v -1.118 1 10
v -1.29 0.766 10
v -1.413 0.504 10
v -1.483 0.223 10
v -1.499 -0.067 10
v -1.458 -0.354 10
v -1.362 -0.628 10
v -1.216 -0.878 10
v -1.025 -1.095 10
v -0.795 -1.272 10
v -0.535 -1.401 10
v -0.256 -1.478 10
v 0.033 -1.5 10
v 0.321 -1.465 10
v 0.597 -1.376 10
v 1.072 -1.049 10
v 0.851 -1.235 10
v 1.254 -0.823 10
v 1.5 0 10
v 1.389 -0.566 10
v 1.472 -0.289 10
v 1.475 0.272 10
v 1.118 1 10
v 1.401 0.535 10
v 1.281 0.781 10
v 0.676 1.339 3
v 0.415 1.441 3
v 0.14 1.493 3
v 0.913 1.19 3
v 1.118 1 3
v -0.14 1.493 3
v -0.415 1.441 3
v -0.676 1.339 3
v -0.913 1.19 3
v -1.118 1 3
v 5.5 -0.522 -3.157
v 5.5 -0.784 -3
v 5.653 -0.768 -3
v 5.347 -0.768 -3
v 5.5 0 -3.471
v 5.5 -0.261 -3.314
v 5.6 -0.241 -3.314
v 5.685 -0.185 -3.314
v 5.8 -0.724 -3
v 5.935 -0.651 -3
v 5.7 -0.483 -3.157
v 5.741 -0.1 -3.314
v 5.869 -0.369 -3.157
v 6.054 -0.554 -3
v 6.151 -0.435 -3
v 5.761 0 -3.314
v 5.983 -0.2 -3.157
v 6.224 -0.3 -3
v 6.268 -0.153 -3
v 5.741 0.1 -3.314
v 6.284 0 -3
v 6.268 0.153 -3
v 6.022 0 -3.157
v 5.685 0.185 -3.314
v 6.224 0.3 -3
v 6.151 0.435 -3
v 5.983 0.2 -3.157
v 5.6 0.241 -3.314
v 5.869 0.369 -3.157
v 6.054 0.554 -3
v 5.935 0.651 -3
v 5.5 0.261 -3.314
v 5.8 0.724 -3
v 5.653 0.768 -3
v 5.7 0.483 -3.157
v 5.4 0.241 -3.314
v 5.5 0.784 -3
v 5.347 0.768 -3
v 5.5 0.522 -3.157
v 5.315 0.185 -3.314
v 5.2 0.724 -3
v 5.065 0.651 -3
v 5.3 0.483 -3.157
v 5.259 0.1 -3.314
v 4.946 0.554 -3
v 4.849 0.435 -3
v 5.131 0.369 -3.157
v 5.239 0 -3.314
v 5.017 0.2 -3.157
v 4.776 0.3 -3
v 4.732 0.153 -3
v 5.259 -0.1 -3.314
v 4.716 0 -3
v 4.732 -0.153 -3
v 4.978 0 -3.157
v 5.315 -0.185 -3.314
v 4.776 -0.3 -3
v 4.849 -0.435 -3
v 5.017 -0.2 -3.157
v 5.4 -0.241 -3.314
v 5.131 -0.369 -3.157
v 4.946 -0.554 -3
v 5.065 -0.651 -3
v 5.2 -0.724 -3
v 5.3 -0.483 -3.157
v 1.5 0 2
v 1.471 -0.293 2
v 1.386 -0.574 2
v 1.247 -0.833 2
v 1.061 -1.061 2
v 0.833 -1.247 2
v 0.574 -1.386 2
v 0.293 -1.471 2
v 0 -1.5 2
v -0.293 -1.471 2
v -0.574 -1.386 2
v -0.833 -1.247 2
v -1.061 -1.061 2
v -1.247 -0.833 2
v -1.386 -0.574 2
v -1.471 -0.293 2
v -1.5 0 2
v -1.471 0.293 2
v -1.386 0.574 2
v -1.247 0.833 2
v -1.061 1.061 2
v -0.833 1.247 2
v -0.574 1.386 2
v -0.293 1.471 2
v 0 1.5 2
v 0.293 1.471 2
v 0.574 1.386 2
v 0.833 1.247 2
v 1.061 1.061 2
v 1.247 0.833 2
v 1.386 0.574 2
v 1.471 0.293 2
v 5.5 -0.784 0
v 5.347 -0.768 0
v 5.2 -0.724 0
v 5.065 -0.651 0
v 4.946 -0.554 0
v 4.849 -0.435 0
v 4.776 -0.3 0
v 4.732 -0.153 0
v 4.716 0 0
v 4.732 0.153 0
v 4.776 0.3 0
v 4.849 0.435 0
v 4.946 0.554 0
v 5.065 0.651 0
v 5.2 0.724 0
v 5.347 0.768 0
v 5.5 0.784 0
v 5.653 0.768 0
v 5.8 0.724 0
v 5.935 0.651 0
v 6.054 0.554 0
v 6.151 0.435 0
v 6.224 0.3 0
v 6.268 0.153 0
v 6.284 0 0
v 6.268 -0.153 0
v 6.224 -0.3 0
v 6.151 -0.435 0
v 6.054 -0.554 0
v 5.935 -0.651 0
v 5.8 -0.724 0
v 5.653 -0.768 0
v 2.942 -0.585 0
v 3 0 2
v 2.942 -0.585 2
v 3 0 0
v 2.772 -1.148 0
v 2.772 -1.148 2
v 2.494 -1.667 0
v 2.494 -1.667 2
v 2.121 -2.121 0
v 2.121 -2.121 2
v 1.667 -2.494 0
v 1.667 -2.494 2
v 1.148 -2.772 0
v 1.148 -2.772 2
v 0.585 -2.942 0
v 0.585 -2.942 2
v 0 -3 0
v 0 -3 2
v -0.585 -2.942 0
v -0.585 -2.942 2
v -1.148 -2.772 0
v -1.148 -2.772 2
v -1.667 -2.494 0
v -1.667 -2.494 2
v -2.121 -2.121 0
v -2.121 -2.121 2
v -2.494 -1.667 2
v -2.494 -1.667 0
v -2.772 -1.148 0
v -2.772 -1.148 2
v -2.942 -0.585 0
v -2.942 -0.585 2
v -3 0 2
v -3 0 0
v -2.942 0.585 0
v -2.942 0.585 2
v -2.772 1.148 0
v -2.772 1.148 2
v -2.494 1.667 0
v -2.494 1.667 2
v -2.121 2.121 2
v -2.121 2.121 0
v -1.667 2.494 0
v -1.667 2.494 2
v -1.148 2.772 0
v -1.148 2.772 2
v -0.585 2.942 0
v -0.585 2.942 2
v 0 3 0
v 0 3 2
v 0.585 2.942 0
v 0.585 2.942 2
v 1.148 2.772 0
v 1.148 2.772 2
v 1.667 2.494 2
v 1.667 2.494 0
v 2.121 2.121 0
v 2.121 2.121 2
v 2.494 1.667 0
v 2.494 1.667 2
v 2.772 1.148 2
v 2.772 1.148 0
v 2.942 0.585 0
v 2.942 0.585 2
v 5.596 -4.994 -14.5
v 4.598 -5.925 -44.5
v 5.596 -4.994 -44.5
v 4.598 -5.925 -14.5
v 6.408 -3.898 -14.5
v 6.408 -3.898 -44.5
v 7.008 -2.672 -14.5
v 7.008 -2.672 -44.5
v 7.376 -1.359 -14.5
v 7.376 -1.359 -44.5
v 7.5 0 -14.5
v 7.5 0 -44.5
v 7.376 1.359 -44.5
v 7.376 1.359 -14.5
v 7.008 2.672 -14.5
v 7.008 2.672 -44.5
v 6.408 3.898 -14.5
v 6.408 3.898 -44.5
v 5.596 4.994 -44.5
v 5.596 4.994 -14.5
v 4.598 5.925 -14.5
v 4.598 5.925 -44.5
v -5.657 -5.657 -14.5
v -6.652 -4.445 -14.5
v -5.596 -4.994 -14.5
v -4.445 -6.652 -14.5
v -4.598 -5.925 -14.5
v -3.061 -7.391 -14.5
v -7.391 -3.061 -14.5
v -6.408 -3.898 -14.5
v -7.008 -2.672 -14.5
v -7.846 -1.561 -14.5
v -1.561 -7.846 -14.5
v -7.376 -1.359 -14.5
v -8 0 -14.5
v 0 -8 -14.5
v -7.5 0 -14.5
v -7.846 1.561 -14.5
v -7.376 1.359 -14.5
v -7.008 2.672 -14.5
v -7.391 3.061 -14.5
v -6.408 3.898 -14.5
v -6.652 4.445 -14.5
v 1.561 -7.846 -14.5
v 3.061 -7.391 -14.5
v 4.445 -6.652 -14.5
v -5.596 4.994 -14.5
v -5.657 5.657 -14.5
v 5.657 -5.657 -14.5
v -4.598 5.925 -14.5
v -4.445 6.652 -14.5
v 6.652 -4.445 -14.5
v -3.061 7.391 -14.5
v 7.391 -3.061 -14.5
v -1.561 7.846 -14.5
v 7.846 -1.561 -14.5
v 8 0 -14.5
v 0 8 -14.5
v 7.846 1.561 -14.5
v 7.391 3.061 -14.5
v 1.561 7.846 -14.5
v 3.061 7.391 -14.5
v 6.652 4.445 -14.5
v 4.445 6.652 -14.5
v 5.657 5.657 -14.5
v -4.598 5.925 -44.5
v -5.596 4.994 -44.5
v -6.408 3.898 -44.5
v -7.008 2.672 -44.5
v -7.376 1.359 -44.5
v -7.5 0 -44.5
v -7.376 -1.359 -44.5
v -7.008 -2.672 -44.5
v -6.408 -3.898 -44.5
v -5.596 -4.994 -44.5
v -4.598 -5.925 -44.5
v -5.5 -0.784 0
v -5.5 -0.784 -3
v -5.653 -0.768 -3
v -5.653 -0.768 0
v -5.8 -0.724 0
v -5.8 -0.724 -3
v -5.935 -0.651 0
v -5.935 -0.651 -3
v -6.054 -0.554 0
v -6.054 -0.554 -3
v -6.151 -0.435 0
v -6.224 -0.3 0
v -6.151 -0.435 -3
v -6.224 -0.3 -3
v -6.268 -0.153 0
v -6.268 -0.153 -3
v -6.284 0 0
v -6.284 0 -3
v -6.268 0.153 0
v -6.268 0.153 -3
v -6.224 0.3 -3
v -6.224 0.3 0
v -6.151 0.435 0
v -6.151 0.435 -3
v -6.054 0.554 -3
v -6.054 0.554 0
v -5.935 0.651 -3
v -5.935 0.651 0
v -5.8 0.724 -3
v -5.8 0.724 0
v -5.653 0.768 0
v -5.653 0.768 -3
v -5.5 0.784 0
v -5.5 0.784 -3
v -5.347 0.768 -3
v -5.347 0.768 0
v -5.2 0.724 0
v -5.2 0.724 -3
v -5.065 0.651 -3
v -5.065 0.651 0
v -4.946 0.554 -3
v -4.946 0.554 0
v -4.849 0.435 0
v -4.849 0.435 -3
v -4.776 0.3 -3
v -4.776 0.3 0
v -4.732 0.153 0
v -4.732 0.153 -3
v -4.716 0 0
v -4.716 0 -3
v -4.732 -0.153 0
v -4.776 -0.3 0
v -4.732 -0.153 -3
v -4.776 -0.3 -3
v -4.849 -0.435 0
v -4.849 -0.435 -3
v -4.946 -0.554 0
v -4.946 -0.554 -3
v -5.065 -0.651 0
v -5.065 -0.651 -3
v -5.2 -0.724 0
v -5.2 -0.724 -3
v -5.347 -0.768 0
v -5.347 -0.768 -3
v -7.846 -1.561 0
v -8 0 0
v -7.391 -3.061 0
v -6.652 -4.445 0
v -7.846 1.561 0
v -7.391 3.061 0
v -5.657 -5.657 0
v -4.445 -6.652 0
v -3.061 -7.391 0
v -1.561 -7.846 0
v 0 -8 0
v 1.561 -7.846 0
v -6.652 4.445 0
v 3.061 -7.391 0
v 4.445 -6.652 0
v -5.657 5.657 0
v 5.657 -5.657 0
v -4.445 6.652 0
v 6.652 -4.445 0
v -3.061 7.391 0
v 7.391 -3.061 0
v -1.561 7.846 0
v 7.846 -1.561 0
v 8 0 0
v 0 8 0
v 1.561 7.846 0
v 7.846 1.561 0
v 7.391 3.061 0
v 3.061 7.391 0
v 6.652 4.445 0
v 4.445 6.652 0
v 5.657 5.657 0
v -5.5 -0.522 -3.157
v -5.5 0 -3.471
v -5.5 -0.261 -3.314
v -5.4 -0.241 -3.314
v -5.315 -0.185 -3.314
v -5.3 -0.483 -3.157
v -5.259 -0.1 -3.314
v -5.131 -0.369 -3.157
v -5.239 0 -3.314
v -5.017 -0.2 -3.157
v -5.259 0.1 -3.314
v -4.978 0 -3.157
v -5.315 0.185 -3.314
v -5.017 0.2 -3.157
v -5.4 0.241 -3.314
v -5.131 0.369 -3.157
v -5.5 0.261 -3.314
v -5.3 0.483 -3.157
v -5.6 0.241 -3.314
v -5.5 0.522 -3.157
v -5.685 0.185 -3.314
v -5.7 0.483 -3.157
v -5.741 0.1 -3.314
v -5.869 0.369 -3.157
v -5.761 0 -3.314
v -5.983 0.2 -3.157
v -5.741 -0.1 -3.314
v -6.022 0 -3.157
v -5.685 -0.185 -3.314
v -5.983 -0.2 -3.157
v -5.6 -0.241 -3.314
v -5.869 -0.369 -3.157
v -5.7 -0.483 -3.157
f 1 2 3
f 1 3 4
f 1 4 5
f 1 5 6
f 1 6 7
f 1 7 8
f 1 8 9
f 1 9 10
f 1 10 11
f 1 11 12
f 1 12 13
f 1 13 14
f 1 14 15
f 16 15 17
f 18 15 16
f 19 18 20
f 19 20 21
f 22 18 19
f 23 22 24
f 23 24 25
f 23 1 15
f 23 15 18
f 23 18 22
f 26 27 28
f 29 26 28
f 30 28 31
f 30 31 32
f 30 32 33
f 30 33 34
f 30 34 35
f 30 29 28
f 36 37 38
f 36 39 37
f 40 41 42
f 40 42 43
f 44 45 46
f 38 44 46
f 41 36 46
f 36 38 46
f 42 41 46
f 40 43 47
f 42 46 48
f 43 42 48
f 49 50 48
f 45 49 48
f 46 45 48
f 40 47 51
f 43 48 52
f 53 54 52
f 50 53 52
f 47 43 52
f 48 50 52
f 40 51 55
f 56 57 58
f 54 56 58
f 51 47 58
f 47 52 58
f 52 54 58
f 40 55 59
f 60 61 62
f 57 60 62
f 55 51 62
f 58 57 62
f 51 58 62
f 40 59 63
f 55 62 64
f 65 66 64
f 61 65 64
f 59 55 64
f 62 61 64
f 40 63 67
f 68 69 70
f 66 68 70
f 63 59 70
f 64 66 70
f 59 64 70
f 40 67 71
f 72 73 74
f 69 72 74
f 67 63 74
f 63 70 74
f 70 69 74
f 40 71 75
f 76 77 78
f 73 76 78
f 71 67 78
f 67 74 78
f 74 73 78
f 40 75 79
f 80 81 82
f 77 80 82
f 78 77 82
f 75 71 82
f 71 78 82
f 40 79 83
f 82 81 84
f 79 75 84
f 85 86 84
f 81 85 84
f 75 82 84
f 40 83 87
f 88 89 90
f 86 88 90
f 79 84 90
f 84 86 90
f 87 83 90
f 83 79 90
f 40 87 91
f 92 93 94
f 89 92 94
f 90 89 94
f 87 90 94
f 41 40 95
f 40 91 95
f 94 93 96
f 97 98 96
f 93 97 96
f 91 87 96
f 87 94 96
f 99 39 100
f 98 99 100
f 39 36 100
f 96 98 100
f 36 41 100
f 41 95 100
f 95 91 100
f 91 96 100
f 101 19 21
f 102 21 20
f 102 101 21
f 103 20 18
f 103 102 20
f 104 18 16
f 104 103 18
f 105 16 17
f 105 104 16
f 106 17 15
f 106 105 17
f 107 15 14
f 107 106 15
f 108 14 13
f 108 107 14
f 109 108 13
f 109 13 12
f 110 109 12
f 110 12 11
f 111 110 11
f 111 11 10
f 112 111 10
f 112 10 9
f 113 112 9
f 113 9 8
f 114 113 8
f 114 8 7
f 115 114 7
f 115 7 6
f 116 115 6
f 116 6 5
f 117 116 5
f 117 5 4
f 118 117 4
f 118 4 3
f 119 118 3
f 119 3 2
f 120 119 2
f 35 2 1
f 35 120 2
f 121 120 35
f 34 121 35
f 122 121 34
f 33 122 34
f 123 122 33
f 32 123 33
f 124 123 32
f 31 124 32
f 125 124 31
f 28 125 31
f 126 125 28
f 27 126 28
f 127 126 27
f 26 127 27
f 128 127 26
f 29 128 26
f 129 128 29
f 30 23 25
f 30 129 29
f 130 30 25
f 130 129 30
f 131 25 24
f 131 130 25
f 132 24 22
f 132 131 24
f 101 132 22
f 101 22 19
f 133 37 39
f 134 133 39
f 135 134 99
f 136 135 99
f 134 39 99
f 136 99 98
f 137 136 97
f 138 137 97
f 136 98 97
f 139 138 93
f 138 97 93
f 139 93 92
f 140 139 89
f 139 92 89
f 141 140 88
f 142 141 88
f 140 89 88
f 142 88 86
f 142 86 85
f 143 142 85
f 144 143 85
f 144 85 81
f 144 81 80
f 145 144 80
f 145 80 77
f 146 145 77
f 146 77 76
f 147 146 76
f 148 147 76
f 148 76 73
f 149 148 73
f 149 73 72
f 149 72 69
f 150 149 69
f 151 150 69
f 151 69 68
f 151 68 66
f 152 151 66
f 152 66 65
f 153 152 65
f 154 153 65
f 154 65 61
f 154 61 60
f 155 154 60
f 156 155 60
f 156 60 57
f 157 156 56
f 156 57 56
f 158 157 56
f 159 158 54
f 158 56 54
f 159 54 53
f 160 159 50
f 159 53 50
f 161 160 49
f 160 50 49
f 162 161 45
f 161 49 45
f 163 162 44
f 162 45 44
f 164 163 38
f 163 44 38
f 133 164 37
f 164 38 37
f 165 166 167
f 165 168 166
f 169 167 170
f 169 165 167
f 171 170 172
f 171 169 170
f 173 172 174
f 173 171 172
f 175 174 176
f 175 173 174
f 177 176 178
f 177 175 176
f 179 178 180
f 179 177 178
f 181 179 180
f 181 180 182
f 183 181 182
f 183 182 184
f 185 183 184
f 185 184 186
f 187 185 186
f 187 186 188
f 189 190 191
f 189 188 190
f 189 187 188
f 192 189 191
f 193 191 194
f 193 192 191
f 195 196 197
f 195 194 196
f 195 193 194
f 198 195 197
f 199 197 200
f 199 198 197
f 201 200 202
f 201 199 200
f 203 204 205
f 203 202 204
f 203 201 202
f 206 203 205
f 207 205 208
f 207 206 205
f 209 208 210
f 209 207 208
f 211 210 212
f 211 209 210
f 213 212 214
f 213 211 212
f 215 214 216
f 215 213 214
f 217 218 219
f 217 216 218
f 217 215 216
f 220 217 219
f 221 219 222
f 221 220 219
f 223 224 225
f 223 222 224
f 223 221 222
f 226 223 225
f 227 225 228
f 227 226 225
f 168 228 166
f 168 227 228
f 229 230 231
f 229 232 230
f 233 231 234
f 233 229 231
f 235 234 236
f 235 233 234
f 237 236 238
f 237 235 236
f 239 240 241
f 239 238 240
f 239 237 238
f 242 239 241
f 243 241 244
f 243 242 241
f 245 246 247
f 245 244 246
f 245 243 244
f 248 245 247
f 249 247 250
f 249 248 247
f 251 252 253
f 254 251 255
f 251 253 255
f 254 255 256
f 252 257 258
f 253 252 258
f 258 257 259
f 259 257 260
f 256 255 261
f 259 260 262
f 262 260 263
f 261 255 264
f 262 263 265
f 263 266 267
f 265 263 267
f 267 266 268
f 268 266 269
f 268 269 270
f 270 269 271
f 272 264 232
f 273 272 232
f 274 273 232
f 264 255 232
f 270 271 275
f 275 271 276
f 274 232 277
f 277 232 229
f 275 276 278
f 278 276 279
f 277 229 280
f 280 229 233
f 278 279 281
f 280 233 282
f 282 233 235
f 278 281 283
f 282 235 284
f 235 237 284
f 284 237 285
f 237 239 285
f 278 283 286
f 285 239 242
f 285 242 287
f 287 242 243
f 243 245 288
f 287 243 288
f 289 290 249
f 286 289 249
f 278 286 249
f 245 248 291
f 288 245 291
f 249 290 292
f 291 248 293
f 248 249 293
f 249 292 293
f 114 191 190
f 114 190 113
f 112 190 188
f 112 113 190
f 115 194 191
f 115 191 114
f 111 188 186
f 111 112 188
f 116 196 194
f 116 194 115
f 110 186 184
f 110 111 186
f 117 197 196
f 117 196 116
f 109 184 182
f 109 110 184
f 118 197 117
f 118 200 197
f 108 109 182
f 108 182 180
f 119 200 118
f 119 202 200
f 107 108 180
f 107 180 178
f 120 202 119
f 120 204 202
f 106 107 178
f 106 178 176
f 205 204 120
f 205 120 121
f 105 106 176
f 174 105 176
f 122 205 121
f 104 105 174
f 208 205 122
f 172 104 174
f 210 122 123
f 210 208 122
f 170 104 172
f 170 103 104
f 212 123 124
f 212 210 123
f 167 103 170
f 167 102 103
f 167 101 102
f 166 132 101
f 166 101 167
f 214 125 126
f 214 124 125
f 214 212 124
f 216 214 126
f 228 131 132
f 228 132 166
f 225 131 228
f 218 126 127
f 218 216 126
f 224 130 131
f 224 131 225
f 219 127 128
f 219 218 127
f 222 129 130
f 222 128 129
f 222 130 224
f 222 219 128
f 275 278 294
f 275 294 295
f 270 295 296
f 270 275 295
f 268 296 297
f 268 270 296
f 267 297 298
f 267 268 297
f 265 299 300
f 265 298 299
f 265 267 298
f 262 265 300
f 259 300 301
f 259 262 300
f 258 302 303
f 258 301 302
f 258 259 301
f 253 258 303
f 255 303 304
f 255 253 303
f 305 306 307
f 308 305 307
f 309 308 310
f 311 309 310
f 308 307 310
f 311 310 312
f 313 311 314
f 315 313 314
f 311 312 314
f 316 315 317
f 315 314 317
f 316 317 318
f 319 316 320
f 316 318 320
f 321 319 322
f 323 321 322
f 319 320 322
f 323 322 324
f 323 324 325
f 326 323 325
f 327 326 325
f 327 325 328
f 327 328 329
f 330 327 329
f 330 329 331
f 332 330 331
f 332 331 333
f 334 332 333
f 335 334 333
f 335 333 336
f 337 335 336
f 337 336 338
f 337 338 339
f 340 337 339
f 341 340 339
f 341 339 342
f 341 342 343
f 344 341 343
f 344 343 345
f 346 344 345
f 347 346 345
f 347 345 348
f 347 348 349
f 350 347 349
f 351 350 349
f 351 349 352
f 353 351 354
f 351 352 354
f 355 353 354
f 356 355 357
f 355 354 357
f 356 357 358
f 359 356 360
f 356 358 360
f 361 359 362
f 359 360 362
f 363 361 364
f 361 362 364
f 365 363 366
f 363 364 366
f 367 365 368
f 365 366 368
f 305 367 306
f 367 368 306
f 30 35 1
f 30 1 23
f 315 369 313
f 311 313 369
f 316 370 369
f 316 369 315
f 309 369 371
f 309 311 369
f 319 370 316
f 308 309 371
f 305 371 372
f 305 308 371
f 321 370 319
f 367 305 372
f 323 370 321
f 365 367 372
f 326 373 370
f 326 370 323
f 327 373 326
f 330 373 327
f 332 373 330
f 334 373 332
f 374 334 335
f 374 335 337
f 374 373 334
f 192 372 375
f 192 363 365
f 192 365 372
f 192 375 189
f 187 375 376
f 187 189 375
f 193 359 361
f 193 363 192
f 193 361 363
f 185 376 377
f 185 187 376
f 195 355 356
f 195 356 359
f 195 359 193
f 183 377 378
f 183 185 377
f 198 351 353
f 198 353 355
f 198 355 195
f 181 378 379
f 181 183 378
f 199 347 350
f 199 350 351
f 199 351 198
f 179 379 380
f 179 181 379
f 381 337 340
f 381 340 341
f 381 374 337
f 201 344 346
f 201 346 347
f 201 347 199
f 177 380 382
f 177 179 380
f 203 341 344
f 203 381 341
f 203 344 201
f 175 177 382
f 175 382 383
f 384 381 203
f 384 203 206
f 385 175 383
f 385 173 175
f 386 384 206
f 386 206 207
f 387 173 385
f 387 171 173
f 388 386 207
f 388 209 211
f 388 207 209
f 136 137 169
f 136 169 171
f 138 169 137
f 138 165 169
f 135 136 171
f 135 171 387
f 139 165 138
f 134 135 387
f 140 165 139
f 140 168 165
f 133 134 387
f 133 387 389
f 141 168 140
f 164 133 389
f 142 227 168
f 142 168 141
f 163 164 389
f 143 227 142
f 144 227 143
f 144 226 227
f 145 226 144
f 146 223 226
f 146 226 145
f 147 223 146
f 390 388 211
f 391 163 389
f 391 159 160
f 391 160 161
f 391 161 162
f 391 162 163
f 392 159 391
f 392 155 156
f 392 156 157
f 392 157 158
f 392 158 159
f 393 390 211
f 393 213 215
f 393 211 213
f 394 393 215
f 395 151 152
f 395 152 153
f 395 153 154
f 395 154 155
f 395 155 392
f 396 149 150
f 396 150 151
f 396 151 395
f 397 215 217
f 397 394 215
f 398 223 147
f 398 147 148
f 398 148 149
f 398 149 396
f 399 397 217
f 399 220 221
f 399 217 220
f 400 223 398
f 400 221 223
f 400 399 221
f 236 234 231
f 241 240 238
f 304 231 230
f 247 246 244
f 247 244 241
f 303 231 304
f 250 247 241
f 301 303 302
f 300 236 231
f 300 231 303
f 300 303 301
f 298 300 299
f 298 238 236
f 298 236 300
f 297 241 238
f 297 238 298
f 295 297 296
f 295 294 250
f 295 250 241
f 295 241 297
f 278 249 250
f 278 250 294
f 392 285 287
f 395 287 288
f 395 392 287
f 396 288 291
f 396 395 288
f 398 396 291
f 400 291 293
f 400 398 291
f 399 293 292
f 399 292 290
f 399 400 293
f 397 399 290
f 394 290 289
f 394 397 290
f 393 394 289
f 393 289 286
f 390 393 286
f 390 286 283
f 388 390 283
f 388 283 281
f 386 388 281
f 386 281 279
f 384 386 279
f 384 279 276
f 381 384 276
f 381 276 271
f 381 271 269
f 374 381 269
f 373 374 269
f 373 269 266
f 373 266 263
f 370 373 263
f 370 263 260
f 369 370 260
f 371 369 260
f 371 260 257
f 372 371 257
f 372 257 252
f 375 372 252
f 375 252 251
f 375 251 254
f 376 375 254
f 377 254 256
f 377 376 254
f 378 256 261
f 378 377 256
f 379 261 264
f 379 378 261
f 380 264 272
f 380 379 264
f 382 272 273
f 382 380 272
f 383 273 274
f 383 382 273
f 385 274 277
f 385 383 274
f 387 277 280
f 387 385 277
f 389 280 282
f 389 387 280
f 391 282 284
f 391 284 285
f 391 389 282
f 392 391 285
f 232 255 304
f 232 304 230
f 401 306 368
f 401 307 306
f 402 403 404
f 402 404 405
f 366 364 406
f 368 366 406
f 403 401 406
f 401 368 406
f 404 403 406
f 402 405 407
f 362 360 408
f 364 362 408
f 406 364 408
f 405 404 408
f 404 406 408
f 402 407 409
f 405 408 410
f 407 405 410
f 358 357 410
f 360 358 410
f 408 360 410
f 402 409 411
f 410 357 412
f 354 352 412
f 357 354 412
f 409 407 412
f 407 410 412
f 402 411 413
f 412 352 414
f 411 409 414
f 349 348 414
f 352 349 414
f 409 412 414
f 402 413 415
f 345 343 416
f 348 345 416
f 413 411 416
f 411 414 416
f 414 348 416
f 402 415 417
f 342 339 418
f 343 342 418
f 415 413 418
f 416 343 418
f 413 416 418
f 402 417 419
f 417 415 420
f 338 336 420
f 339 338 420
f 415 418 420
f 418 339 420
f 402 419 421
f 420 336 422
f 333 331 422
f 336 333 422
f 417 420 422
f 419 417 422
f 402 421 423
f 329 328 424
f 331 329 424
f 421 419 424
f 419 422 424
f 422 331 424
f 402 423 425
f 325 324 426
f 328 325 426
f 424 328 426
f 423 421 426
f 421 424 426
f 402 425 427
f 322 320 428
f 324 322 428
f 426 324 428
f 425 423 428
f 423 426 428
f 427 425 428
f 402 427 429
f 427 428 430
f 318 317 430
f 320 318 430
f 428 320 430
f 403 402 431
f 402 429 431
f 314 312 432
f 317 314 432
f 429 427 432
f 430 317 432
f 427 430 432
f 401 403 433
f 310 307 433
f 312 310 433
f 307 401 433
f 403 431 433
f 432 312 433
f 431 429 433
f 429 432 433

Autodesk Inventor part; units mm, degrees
ref_plane "YZ Plane" through (0, 0, 0) normal (1, 0, 0) x (0, 1, 0)
ref_plane "XZ Plane" through (0, 0, 0) normal (0, 1, 0) x (-1, 0, 0)
ref_plane "XY Plane" through (0, 0, 0) normal (0, 0, 1) x (1, 0, 0)
sketch "Skizze1" plane through (0, 0, 0) normal (0, 0, 1) x (1, 0, 0)
  circle A0 centre (0, 0) radius 8
  line L0 (-5.5, 0) -> (5.5, 0) construction
  circle A1 centre (0, 0) radius 3
  circle A2 centre (0, 0) radius 1.5
  arc A3 (-1.118, 1) -> (1.118, 1) centre (0, 0) ccw construction
  line L1 (-1.118, 1) -> (1.118, 1)
  dimension "d3" = 3
  dimension "d0" = 16
  dimension "d1" = 11
  dimension "d2" = 6
  dimension "d4" = 2.5
extrude "Extrusion1" add sketch "Skizze1" along normal blind 2 contours A1 | A2 L1 | L1 A2
sketch "Skizze2" plane through (0, 0, 2) normal (0, 0, 1) x (1, 0, 0)
  circle A0 centre (0, 0) radius 1.5 projected
extrude "Extrusion2" add sketch "Skizze2" along normal blind 1
sketch "Skizze3" plane through (0, 0, 3) normal (0, 0, 1) x (1, 0, 0)
  circle A0 centre (0, 0) radius 1.5 projected
  line L0 (-1.118, 1) -> (1.118, 1) projected
  circle A1 centre (0, 0) radius 1.5 projected
extrude "Extrusion3" add sketch "Skizze3" along normal blind 7 contours A0 L0 picked at (0.0594, 0.1702)
extrude "Extrusion4" add sketch "Skizze1" against normal blind 14.5 contours A0 | A1 | A2 L1 | L1 A2
sketch "Skizze4" plane through (0, 0, -14.5) normal (0, 0, -1) x (-1, 0, 0)
  circle A0 centre (0, 0) radius 8 projected
  arc A1 (-4.5983, 5.925) -> (-4.5983, -5.925) centre (0, 0) ccw
  arc A2 (4.5983, -5.925) -> (4.5983, 5.925) centre (0, 0) ccw
  line L0 (-4.5983, 5.925) -> (4.5983, 5.925)
  line L1 (4.5983, -5.925) -> (-4.5983, -5.925)
  dimension "d14" = 7.5
  dimension "d15" = 11.85
extrude "Extrusion5" add sketch "Skizze4" along normal blind 30 contours L0 A2 L1 A1
hole "Bohrung1" at (-5.5, 0, 0) at (5.5, 0, 0) direction (0, 0, -1) diameter 1.567 depth 3 tip angle 118 thread size "M2x0.4" class "6H" standard "ANSI Metric M Profile"
properties part number "dc-motor_12V_60U-min" material "Aluminium 6061"
